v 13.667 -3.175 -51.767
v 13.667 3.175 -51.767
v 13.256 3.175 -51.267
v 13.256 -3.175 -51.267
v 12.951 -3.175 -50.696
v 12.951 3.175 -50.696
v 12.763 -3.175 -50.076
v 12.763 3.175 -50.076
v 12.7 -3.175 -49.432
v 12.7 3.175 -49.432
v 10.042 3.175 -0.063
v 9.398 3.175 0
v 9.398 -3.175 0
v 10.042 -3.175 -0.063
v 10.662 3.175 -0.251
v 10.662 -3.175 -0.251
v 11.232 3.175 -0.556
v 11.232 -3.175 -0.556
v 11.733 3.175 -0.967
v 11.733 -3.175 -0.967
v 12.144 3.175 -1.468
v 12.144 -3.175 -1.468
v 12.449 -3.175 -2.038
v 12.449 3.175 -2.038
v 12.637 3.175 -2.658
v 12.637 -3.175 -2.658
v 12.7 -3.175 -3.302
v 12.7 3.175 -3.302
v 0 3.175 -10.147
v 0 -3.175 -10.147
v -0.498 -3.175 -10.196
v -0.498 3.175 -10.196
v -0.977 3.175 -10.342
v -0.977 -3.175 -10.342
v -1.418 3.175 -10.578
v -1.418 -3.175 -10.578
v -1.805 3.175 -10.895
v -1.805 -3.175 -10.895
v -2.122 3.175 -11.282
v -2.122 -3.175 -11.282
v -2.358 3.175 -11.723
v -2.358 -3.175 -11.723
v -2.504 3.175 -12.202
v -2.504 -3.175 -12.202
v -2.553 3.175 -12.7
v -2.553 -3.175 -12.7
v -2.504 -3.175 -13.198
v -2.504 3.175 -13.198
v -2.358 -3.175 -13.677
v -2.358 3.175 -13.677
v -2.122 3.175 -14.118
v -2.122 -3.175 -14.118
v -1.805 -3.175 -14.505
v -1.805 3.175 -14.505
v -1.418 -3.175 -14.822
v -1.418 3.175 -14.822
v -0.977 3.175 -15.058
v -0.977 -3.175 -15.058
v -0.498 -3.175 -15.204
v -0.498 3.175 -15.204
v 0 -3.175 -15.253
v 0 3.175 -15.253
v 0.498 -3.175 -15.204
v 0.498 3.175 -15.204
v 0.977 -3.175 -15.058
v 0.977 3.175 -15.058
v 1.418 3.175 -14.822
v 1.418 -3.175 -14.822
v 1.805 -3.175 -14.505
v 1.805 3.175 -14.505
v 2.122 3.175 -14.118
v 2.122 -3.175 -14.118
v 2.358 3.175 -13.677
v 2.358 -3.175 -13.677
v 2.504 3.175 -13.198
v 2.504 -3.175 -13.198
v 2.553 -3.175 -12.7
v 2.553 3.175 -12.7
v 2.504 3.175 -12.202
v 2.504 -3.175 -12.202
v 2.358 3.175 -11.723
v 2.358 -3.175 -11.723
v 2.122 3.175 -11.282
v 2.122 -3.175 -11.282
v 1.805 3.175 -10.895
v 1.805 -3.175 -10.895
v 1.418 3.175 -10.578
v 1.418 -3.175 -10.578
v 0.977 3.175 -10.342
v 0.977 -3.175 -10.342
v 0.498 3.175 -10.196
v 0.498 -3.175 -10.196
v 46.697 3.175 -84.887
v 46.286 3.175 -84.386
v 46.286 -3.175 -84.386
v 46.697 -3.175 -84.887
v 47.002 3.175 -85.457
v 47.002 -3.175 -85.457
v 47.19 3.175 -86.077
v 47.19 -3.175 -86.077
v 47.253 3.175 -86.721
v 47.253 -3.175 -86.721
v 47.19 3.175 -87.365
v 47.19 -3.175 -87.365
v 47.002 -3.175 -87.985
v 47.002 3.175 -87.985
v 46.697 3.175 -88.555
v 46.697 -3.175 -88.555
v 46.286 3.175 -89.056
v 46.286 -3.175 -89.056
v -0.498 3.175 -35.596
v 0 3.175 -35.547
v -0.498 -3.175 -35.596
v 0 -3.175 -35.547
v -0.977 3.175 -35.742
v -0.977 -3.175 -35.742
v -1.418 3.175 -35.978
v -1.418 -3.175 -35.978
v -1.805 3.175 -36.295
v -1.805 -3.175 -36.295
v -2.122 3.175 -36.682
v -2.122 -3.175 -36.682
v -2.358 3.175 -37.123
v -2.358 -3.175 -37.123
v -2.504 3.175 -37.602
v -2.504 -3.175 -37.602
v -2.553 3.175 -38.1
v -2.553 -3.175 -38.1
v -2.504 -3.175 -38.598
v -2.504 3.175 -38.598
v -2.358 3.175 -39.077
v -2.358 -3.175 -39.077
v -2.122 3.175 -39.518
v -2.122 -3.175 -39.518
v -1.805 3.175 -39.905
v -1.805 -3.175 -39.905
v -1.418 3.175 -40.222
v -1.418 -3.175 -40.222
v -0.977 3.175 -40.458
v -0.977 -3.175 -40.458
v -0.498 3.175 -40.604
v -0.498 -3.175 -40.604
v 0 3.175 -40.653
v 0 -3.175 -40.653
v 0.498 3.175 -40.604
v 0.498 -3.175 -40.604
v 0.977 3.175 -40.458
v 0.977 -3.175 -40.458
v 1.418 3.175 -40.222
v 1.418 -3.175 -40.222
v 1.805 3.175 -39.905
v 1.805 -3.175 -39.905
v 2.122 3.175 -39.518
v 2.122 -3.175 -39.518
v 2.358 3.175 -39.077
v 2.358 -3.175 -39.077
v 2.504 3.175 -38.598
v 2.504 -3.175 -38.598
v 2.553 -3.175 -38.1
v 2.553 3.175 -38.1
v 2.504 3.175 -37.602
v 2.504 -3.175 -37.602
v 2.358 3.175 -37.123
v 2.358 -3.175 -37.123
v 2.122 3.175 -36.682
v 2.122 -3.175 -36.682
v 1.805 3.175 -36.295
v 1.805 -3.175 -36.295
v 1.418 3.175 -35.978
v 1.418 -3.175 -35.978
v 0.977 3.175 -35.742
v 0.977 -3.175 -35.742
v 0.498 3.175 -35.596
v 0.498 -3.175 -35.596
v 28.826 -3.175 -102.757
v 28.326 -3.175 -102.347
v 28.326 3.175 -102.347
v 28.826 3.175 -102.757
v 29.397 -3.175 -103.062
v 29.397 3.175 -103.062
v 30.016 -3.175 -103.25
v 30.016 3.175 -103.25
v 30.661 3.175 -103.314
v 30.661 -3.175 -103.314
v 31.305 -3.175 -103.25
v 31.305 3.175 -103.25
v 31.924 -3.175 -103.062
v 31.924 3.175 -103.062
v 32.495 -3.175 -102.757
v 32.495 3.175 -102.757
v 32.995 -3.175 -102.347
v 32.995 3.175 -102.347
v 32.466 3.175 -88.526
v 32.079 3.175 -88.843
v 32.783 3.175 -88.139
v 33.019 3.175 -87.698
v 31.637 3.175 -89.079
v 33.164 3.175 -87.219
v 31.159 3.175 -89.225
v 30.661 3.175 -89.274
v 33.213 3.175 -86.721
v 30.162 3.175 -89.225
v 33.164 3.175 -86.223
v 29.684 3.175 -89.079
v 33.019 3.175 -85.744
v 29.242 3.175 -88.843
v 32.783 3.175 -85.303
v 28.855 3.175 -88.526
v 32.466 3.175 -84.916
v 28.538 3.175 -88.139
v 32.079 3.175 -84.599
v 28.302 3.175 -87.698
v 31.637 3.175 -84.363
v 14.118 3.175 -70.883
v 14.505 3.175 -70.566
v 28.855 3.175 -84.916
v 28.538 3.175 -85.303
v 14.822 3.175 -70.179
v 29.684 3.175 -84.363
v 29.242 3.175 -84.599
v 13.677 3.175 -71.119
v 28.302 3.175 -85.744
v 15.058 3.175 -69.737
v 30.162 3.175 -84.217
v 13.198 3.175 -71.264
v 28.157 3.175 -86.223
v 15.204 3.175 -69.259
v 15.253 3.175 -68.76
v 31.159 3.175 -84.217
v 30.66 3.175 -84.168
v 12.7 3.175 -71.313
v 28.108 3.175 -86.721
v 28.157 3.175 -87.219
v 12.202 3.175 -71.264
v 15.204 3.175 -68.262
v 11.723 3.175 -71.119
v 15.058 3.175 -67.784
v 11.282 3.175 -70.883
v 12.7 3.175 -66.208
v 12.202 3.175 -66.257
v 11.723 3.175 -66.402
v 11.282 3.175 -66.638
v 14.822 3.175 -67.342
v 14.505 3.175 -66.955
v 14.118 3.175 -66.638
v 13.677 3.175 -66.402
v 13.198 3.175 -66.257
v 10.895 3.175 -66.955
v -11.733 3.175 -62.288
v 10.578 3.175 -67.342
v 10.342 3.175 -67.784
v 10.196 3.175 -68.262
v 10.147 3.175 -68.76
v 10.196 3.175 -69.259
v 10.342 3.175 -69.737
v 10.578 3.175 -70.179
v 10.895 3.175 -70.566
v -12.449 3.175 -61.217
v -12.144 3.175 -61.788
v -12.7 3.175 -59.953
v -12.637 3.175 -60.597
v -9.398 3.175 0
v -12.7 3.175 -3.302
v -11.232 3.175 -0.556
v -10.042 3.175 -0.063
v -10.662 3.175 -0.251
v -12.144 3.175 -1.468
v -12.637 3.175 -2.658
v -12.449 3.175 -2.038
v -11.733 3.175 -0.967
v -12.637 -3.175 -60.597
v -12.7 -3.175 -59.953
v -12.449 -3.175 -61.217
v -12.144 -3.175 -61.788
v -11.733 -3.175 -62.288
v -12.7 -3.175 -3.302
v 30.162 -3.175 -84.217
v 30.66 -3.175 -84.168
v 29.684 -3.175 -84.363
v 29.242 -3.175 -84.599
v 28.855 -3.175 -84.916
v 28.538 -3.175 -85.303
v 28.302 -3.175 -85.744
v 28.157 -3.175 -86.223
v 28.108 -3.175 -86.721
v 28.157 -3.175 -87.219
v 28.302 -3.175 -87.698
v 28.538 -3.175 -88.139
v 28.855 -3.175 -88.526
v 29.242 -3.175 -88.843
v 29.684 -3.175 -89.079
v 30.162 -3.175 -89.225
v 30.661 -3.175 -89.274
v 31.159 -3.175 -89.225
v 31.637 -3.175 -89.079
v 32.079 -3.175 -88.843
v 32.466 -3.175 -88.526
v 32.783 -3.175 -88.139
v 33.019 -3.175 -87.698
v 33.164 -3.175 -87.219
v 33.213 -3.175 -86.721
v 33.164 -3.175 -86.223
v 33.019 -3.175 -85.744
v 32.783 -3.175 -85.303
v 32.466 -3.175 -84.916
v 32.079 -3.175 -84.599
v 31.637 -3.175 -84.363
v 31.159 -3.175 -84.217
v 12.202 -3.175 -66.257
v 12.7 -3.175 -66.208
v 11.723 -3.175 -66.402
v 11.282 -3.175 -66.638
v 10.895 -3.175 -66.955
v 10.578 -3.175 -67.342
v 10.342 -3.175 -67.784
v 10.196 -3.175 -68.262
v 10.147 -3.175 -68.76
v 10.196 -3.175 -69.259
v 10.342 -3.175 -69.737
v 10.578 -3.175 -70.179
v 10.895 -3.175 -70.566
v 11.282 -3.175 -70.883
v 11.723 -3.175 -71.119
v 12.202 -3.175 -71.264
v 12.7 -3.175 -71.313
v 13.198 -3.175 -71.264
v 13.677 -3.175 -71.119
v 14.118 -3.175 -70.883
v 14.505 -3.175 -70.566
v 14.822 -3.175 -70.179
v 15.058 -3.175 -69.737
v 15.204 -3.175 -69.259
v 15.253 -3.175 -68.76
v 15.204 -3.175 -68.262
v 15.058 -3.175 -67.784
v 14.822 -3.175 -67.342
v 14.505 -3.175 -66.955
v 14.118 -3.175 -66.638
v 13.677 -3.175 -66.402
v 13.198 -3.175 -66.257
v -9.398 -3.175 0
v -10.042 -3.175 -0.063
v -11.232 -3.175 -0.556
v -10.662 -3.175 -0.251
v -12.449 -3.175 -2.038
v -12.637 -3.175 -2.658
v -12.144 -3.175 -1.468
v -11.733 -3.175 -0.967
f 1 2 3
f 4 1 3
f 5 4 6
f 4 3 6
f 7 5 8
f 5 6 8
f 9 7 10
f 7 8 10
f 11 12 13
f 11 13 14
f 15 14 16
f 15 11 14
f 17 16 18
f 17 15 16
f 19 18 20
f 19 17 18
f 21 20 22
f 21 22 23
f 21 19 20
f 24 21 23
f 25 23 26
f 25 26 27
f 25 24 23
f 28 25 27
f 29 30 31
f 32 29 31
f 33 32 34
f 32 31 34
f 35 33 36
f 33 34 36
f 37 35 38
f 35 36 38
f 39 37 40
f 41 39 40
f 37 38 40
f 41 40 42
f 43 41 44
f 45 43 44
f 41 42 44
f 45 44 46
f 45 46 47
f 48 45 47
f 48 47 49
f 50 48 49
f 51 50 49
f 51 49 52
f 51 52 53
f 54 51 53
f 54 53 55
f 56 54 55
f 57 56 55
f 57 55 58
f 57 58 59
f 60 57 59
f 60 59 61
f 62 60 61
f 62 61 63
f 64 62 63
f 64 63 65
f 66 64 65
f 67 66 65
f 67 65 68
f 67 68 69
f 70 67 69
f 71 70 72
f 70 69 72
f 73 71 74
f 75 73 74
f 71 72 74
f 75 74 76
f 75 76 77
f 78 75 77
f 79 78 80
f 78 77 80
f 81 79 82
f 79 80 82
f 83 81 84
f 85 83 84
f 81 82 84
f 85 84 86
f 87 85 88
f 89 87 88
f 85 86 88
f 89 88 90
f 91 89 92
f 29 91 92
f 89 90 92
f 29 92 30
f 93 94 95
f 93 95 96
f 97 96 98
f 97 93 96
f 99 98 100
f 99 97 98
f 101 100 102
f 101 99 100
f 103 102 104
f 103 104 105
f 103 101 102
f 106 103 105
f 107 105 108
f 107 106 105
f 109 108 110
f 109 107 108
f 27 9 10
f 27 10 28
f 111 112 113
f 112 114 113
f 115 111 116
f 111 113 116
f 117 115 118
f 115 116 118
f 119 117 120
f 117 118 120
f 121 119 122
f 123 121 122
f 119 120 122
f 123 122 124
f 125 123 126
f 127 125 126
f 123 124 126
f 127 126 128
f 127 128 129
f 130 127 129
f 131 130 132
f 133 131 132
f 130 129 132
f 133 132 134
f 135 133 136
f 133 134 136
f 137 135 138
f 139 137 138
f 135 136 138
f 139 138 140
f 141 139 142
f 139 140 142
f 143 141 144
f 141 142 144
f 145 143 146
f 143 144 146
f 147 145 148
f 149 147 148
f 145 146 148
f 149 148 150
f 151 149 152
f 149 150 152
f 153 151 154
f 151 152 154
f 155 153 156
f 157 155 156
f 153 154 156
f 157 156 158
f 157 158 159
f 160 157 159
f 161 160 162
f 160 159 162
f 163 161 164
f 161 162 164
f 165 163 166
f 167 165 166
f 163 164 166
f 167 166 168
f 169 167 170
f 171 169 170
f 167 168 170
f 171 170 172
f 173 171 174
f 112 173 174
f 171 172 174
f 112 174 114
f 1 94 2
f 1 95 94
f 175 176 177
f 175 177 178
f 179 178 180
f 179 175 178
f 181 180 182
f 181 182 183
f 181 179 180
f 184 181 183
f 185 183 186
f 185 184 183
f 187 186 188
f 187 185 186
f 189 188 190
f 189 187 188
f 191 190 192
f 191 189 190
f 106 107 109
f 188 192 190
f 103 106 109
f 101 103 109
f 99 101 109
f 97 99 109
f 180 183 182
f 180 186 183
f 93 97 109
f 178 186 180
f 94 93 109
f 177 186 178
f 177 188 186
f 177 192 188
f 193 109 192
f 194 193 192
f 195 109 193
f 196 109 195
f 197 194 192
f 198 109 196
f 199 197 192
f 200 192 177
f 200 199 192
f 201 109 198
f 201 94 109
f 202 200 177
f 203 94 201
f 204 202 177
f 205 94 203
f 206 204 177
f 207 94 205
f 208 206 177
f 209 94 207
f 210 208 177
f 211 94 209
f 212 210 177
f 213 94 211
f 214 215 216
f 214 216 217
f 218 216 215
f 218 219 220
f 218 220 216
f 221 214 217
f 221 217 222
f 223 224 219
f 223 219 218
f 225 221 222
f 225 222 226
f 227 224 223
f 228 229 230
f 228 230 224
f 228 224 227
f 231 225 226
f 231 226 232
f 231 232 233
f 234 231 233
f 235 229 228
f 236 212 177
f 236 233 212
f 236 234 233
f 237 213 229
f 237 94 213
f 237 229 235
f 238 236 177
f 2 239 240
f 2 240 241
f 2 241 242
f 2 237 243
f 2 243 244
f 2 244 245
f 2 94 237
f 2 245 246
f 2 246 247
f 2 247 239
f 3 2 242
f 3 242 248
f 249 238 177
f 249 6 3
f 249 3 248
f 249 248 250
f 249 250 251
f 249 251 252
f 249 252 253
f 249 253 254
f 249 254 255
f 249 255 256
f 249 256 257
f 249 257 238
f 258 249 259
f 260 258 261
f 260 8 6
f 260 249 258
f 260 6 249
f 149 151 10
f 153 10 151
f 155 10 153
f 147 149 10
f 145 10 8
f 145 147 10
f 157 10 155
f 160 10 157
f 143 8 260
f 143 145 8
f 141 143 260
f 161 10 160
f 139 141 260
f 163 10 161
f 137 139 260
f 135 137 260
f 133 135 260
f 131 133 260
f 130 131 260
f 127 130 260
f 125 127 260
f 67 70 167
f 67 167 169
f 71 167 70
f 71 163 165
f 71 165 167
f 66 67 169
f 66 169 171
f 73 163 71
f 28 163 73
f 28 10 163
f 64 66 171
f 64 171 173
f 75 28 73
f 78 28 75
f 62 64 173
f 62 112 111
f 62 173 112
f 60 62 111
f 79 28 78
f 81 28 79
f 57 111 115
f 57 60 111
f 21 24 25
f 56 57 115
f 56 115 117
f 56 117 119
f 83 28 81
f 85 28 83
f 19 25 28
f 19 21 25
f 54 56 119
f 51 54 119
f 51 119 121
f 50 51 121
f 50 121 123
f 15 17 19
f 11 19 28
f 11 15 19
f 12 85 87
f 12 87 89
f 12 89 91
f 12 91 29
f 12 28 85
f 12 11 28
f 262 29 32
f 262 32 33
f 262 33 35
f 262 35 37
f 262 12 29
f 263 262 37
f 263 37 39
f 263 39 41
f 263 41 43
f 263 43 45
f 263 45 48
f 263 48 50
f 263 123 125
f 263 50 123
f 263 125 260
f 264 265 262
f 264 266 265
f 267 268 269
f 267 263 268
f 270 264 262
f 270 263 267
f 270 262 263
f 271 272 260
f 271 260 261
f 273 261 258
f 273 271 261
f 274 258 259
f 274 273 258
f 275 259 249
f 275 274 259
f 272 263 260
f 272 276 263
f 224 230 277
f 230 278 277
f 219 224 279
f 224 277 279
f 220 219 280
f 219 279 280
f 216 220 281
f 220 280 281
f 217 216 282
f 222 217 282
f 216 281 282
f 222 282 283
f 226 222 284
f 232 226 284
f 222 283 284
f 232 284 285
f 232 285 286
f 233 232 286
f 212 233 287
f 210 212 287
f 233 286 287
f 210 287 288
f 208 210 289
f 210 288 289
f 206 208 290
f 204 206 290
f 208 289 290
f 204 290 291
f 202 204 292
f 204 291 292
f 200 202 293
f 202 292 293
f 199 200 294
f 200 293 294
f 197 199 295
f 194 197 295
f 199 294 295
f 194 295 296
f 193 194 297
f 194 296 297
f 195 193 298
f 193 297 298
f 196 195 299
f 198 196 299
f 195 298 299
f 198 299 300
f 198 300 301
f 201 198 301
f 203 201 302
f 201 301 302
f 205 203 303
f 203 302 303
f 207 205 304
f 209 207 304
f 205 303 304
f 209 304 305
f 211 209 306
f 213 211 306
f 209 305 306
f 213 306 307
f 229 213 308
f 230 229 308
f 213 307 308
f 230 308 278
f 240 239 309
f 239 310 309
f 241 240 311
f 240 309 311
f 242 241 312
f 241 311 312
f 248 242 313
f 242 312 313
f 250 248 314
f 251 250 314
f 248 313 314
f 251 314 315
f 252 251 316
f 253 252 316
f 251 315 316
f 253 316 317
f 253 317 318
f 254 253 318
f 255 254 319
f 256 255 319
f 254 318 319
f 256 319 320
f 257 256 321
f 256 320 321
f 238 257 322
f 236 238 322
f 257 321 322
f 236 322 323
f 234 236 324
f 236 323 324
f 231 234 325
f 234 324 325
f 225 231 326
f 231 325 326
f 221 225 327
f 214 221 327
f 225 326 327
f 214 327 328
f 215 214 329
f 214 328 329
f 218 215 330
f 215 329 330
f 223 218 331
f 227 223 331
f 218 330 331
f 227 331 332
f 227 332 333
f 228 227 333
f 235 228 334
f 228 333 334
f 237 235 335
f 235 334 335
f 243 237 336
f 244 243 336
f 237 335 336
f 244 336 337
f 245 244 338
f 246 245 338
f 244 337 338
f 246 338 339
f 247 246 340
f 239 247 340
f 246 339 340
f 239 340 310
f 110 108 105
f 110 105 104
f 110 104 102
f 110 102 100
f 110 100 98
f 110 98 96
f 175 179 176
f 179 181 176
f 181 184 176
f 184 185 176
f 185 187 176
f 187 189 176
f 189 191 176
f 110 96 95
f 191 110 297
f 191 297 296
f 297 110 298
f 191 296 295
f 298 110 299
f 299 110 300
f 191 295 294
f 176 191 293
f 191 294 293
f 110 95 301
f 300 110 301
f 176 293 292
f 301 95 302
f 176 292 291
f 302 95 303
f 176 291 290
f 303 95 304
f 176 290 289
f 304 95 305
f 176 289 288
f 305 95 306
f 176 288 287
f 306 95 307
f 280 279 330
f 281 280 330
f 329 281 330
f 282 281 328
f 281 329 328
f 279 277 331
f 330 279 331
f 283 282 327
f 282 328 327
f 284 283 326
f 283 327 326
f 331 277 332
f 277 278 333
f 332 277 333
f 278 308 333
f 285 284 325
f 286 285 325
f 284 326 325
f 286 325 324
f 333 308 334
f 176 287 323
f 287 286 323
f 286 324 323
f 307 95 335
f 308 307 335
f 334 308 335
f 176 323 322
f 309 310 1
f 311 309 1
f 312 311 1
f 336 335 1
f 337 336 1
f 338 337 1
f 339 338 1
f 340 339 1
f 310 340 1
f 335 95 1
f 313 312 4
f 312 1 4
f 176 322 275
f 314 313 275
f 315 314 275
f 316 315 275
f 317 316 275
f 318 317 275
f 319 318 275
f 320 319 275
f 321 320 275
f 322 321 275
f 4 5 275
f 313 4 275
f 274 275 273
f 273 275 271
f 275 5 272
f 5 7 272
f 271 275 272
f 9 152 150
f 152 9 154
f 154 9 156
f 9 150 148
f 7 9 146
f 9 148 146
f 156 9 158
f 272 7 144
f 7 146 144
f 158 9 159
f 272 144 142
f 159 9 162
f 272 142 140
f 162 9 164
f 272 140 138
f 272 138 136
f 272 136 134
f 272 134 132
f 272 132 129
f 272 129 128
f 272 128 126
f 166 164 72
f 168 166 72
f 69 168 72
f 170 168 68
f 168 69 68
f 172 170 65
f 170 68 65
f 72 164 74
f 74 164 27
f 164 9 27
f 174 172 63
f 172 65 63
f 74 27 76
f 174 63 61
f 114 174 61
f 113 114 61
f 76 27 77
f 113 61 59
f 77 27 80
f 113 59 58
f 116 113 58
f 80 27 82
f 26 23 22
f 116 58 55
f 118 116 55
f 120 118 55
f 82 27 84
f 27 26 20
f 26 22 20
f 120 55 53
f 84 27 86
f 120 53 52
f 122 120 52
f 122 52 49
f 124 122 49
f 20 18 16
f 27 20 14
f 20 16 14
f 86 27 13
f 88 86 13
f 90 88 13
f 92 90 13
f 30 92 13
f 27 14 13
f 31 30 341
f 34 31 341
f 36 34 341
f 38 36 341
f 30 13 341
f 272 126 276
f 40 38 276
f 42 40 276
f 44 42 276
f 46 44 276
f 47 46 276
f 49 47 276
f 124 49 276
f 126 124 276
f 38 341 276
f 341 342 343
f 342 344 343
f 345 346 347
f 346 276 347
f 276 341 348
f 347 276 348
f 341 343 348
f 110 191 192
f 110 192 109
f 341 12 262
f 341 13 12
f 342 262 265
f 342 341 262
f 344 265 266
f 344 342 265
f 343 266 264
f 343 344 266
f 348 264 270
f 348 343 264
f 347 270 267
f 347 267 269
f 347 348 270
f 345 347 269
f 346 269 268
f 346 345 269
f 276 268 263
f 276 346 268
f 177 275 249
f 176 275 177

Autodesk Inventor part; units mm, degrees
ref_plane "YZ Plane" through (0, 0, 0) normal (1, 0, 0) x (0, 1, 0)
ref_plane "XZ Plane" through (0, 0, 0) normal (0, 1, 0) x (-1, 0, 0)
ref_plane "XY Plane" through (0, 0, 0) normal (0, 0, 1) x (1, 0, 0)
sketch "Sketch1" plane through (0, 0, 0) normal (0, 1, 0) x (-1, 0, 0)
  line L0 (-12.7, 0) -> (12.7, 0)
  line L1 (12.7, 0) -> (12.7, -61.321)
  line L2 (12.7, -61.321) -> (-30.6605, -104.6815)
  line L3 (-30.6605, -104.6815) -> (-48.621, -86.721)
  line L4 (-48.621, -86.721) -> (-12.7, -50.8)
  line L5 (-12.7, -50.8) -> (-12.7, 0)
  point P0 (0, 0)
  point P1 (0, 0)
  dimension "d0" = 25.4
  dimension "d2" = 25.4
  dimension "d4" = 135
  dimension "d8" = 50.8
  dimension "d9" = 50.8
extrude "Extrusion1" add sketch "Sketch1" along normal mid plane 6.35
sketch "Sketch2" plane through (0, 3.175, 0) normal (0, 1, 0) x (1, 0, 0)
  line L0 (12.7, 50.8) -> (12.7, 0) construction
  line L1 (12.7, 0) -> (-12.7, 0) construction
  line L2 (-12.7, 0) -> (-12.7, 61.321) construction
  line L3 (-12.7, 61.321) -> (30.6605, 104.6815) construction
  line L4 (30.6605, 104.6815) -> (48.621, 86.721) construction
  line L5 (48.621, 86.721) -> (12.7, 50.8) construction
  line L6 (48.621, 86.721) -> (30.6605, 104.6815) construction
  line L7 (39.6408, 95.7013) -> (0, 56.0605) construction
  line L8 (0, 56.0605) -> (0, 0) construction
  line L9 (-12.7, 0) -> (12.7, 0) construction
  point P0 (0, 0)
  point P1 (0, 12.7)
  point P2 (0, 38.1)
  point P3 (30.6605, 86.721)
  point P4 (12.7, 68.7605)
  dimension "d12" = 25.4
  dimension "d13" = 12.7
  dimension "d14" = 25.4
  dimension "d15" = 12.7
hole "Hole1" at (0, 3.175, -12.7) at (0, 3.175, -38.1) at (30.6605, 3.175, -86.721) at (12.7, 3.175, -68.7605) direction (0, -1, 0) diameter 5.1054 end through all clearance for "Flat Head Machine Screw (82)" size "#10" standard "Ansi Unified Screw Threads"
fillet "Fillet1" radius 3.302 6 edges at (12.7, 0, -50.8) (-12.7, 0, -61.321) (48.621, 0, -86.721) (30.6605, 0, -104.6815) (12.7, 0, 0) (-12.7, 0, 0)
equation "\"d2\" = d0"
equation "\"d14\" = d12"
equation "\"d15\" = d13"
properties part number "CL3-009" material "Aluminum 6061"
